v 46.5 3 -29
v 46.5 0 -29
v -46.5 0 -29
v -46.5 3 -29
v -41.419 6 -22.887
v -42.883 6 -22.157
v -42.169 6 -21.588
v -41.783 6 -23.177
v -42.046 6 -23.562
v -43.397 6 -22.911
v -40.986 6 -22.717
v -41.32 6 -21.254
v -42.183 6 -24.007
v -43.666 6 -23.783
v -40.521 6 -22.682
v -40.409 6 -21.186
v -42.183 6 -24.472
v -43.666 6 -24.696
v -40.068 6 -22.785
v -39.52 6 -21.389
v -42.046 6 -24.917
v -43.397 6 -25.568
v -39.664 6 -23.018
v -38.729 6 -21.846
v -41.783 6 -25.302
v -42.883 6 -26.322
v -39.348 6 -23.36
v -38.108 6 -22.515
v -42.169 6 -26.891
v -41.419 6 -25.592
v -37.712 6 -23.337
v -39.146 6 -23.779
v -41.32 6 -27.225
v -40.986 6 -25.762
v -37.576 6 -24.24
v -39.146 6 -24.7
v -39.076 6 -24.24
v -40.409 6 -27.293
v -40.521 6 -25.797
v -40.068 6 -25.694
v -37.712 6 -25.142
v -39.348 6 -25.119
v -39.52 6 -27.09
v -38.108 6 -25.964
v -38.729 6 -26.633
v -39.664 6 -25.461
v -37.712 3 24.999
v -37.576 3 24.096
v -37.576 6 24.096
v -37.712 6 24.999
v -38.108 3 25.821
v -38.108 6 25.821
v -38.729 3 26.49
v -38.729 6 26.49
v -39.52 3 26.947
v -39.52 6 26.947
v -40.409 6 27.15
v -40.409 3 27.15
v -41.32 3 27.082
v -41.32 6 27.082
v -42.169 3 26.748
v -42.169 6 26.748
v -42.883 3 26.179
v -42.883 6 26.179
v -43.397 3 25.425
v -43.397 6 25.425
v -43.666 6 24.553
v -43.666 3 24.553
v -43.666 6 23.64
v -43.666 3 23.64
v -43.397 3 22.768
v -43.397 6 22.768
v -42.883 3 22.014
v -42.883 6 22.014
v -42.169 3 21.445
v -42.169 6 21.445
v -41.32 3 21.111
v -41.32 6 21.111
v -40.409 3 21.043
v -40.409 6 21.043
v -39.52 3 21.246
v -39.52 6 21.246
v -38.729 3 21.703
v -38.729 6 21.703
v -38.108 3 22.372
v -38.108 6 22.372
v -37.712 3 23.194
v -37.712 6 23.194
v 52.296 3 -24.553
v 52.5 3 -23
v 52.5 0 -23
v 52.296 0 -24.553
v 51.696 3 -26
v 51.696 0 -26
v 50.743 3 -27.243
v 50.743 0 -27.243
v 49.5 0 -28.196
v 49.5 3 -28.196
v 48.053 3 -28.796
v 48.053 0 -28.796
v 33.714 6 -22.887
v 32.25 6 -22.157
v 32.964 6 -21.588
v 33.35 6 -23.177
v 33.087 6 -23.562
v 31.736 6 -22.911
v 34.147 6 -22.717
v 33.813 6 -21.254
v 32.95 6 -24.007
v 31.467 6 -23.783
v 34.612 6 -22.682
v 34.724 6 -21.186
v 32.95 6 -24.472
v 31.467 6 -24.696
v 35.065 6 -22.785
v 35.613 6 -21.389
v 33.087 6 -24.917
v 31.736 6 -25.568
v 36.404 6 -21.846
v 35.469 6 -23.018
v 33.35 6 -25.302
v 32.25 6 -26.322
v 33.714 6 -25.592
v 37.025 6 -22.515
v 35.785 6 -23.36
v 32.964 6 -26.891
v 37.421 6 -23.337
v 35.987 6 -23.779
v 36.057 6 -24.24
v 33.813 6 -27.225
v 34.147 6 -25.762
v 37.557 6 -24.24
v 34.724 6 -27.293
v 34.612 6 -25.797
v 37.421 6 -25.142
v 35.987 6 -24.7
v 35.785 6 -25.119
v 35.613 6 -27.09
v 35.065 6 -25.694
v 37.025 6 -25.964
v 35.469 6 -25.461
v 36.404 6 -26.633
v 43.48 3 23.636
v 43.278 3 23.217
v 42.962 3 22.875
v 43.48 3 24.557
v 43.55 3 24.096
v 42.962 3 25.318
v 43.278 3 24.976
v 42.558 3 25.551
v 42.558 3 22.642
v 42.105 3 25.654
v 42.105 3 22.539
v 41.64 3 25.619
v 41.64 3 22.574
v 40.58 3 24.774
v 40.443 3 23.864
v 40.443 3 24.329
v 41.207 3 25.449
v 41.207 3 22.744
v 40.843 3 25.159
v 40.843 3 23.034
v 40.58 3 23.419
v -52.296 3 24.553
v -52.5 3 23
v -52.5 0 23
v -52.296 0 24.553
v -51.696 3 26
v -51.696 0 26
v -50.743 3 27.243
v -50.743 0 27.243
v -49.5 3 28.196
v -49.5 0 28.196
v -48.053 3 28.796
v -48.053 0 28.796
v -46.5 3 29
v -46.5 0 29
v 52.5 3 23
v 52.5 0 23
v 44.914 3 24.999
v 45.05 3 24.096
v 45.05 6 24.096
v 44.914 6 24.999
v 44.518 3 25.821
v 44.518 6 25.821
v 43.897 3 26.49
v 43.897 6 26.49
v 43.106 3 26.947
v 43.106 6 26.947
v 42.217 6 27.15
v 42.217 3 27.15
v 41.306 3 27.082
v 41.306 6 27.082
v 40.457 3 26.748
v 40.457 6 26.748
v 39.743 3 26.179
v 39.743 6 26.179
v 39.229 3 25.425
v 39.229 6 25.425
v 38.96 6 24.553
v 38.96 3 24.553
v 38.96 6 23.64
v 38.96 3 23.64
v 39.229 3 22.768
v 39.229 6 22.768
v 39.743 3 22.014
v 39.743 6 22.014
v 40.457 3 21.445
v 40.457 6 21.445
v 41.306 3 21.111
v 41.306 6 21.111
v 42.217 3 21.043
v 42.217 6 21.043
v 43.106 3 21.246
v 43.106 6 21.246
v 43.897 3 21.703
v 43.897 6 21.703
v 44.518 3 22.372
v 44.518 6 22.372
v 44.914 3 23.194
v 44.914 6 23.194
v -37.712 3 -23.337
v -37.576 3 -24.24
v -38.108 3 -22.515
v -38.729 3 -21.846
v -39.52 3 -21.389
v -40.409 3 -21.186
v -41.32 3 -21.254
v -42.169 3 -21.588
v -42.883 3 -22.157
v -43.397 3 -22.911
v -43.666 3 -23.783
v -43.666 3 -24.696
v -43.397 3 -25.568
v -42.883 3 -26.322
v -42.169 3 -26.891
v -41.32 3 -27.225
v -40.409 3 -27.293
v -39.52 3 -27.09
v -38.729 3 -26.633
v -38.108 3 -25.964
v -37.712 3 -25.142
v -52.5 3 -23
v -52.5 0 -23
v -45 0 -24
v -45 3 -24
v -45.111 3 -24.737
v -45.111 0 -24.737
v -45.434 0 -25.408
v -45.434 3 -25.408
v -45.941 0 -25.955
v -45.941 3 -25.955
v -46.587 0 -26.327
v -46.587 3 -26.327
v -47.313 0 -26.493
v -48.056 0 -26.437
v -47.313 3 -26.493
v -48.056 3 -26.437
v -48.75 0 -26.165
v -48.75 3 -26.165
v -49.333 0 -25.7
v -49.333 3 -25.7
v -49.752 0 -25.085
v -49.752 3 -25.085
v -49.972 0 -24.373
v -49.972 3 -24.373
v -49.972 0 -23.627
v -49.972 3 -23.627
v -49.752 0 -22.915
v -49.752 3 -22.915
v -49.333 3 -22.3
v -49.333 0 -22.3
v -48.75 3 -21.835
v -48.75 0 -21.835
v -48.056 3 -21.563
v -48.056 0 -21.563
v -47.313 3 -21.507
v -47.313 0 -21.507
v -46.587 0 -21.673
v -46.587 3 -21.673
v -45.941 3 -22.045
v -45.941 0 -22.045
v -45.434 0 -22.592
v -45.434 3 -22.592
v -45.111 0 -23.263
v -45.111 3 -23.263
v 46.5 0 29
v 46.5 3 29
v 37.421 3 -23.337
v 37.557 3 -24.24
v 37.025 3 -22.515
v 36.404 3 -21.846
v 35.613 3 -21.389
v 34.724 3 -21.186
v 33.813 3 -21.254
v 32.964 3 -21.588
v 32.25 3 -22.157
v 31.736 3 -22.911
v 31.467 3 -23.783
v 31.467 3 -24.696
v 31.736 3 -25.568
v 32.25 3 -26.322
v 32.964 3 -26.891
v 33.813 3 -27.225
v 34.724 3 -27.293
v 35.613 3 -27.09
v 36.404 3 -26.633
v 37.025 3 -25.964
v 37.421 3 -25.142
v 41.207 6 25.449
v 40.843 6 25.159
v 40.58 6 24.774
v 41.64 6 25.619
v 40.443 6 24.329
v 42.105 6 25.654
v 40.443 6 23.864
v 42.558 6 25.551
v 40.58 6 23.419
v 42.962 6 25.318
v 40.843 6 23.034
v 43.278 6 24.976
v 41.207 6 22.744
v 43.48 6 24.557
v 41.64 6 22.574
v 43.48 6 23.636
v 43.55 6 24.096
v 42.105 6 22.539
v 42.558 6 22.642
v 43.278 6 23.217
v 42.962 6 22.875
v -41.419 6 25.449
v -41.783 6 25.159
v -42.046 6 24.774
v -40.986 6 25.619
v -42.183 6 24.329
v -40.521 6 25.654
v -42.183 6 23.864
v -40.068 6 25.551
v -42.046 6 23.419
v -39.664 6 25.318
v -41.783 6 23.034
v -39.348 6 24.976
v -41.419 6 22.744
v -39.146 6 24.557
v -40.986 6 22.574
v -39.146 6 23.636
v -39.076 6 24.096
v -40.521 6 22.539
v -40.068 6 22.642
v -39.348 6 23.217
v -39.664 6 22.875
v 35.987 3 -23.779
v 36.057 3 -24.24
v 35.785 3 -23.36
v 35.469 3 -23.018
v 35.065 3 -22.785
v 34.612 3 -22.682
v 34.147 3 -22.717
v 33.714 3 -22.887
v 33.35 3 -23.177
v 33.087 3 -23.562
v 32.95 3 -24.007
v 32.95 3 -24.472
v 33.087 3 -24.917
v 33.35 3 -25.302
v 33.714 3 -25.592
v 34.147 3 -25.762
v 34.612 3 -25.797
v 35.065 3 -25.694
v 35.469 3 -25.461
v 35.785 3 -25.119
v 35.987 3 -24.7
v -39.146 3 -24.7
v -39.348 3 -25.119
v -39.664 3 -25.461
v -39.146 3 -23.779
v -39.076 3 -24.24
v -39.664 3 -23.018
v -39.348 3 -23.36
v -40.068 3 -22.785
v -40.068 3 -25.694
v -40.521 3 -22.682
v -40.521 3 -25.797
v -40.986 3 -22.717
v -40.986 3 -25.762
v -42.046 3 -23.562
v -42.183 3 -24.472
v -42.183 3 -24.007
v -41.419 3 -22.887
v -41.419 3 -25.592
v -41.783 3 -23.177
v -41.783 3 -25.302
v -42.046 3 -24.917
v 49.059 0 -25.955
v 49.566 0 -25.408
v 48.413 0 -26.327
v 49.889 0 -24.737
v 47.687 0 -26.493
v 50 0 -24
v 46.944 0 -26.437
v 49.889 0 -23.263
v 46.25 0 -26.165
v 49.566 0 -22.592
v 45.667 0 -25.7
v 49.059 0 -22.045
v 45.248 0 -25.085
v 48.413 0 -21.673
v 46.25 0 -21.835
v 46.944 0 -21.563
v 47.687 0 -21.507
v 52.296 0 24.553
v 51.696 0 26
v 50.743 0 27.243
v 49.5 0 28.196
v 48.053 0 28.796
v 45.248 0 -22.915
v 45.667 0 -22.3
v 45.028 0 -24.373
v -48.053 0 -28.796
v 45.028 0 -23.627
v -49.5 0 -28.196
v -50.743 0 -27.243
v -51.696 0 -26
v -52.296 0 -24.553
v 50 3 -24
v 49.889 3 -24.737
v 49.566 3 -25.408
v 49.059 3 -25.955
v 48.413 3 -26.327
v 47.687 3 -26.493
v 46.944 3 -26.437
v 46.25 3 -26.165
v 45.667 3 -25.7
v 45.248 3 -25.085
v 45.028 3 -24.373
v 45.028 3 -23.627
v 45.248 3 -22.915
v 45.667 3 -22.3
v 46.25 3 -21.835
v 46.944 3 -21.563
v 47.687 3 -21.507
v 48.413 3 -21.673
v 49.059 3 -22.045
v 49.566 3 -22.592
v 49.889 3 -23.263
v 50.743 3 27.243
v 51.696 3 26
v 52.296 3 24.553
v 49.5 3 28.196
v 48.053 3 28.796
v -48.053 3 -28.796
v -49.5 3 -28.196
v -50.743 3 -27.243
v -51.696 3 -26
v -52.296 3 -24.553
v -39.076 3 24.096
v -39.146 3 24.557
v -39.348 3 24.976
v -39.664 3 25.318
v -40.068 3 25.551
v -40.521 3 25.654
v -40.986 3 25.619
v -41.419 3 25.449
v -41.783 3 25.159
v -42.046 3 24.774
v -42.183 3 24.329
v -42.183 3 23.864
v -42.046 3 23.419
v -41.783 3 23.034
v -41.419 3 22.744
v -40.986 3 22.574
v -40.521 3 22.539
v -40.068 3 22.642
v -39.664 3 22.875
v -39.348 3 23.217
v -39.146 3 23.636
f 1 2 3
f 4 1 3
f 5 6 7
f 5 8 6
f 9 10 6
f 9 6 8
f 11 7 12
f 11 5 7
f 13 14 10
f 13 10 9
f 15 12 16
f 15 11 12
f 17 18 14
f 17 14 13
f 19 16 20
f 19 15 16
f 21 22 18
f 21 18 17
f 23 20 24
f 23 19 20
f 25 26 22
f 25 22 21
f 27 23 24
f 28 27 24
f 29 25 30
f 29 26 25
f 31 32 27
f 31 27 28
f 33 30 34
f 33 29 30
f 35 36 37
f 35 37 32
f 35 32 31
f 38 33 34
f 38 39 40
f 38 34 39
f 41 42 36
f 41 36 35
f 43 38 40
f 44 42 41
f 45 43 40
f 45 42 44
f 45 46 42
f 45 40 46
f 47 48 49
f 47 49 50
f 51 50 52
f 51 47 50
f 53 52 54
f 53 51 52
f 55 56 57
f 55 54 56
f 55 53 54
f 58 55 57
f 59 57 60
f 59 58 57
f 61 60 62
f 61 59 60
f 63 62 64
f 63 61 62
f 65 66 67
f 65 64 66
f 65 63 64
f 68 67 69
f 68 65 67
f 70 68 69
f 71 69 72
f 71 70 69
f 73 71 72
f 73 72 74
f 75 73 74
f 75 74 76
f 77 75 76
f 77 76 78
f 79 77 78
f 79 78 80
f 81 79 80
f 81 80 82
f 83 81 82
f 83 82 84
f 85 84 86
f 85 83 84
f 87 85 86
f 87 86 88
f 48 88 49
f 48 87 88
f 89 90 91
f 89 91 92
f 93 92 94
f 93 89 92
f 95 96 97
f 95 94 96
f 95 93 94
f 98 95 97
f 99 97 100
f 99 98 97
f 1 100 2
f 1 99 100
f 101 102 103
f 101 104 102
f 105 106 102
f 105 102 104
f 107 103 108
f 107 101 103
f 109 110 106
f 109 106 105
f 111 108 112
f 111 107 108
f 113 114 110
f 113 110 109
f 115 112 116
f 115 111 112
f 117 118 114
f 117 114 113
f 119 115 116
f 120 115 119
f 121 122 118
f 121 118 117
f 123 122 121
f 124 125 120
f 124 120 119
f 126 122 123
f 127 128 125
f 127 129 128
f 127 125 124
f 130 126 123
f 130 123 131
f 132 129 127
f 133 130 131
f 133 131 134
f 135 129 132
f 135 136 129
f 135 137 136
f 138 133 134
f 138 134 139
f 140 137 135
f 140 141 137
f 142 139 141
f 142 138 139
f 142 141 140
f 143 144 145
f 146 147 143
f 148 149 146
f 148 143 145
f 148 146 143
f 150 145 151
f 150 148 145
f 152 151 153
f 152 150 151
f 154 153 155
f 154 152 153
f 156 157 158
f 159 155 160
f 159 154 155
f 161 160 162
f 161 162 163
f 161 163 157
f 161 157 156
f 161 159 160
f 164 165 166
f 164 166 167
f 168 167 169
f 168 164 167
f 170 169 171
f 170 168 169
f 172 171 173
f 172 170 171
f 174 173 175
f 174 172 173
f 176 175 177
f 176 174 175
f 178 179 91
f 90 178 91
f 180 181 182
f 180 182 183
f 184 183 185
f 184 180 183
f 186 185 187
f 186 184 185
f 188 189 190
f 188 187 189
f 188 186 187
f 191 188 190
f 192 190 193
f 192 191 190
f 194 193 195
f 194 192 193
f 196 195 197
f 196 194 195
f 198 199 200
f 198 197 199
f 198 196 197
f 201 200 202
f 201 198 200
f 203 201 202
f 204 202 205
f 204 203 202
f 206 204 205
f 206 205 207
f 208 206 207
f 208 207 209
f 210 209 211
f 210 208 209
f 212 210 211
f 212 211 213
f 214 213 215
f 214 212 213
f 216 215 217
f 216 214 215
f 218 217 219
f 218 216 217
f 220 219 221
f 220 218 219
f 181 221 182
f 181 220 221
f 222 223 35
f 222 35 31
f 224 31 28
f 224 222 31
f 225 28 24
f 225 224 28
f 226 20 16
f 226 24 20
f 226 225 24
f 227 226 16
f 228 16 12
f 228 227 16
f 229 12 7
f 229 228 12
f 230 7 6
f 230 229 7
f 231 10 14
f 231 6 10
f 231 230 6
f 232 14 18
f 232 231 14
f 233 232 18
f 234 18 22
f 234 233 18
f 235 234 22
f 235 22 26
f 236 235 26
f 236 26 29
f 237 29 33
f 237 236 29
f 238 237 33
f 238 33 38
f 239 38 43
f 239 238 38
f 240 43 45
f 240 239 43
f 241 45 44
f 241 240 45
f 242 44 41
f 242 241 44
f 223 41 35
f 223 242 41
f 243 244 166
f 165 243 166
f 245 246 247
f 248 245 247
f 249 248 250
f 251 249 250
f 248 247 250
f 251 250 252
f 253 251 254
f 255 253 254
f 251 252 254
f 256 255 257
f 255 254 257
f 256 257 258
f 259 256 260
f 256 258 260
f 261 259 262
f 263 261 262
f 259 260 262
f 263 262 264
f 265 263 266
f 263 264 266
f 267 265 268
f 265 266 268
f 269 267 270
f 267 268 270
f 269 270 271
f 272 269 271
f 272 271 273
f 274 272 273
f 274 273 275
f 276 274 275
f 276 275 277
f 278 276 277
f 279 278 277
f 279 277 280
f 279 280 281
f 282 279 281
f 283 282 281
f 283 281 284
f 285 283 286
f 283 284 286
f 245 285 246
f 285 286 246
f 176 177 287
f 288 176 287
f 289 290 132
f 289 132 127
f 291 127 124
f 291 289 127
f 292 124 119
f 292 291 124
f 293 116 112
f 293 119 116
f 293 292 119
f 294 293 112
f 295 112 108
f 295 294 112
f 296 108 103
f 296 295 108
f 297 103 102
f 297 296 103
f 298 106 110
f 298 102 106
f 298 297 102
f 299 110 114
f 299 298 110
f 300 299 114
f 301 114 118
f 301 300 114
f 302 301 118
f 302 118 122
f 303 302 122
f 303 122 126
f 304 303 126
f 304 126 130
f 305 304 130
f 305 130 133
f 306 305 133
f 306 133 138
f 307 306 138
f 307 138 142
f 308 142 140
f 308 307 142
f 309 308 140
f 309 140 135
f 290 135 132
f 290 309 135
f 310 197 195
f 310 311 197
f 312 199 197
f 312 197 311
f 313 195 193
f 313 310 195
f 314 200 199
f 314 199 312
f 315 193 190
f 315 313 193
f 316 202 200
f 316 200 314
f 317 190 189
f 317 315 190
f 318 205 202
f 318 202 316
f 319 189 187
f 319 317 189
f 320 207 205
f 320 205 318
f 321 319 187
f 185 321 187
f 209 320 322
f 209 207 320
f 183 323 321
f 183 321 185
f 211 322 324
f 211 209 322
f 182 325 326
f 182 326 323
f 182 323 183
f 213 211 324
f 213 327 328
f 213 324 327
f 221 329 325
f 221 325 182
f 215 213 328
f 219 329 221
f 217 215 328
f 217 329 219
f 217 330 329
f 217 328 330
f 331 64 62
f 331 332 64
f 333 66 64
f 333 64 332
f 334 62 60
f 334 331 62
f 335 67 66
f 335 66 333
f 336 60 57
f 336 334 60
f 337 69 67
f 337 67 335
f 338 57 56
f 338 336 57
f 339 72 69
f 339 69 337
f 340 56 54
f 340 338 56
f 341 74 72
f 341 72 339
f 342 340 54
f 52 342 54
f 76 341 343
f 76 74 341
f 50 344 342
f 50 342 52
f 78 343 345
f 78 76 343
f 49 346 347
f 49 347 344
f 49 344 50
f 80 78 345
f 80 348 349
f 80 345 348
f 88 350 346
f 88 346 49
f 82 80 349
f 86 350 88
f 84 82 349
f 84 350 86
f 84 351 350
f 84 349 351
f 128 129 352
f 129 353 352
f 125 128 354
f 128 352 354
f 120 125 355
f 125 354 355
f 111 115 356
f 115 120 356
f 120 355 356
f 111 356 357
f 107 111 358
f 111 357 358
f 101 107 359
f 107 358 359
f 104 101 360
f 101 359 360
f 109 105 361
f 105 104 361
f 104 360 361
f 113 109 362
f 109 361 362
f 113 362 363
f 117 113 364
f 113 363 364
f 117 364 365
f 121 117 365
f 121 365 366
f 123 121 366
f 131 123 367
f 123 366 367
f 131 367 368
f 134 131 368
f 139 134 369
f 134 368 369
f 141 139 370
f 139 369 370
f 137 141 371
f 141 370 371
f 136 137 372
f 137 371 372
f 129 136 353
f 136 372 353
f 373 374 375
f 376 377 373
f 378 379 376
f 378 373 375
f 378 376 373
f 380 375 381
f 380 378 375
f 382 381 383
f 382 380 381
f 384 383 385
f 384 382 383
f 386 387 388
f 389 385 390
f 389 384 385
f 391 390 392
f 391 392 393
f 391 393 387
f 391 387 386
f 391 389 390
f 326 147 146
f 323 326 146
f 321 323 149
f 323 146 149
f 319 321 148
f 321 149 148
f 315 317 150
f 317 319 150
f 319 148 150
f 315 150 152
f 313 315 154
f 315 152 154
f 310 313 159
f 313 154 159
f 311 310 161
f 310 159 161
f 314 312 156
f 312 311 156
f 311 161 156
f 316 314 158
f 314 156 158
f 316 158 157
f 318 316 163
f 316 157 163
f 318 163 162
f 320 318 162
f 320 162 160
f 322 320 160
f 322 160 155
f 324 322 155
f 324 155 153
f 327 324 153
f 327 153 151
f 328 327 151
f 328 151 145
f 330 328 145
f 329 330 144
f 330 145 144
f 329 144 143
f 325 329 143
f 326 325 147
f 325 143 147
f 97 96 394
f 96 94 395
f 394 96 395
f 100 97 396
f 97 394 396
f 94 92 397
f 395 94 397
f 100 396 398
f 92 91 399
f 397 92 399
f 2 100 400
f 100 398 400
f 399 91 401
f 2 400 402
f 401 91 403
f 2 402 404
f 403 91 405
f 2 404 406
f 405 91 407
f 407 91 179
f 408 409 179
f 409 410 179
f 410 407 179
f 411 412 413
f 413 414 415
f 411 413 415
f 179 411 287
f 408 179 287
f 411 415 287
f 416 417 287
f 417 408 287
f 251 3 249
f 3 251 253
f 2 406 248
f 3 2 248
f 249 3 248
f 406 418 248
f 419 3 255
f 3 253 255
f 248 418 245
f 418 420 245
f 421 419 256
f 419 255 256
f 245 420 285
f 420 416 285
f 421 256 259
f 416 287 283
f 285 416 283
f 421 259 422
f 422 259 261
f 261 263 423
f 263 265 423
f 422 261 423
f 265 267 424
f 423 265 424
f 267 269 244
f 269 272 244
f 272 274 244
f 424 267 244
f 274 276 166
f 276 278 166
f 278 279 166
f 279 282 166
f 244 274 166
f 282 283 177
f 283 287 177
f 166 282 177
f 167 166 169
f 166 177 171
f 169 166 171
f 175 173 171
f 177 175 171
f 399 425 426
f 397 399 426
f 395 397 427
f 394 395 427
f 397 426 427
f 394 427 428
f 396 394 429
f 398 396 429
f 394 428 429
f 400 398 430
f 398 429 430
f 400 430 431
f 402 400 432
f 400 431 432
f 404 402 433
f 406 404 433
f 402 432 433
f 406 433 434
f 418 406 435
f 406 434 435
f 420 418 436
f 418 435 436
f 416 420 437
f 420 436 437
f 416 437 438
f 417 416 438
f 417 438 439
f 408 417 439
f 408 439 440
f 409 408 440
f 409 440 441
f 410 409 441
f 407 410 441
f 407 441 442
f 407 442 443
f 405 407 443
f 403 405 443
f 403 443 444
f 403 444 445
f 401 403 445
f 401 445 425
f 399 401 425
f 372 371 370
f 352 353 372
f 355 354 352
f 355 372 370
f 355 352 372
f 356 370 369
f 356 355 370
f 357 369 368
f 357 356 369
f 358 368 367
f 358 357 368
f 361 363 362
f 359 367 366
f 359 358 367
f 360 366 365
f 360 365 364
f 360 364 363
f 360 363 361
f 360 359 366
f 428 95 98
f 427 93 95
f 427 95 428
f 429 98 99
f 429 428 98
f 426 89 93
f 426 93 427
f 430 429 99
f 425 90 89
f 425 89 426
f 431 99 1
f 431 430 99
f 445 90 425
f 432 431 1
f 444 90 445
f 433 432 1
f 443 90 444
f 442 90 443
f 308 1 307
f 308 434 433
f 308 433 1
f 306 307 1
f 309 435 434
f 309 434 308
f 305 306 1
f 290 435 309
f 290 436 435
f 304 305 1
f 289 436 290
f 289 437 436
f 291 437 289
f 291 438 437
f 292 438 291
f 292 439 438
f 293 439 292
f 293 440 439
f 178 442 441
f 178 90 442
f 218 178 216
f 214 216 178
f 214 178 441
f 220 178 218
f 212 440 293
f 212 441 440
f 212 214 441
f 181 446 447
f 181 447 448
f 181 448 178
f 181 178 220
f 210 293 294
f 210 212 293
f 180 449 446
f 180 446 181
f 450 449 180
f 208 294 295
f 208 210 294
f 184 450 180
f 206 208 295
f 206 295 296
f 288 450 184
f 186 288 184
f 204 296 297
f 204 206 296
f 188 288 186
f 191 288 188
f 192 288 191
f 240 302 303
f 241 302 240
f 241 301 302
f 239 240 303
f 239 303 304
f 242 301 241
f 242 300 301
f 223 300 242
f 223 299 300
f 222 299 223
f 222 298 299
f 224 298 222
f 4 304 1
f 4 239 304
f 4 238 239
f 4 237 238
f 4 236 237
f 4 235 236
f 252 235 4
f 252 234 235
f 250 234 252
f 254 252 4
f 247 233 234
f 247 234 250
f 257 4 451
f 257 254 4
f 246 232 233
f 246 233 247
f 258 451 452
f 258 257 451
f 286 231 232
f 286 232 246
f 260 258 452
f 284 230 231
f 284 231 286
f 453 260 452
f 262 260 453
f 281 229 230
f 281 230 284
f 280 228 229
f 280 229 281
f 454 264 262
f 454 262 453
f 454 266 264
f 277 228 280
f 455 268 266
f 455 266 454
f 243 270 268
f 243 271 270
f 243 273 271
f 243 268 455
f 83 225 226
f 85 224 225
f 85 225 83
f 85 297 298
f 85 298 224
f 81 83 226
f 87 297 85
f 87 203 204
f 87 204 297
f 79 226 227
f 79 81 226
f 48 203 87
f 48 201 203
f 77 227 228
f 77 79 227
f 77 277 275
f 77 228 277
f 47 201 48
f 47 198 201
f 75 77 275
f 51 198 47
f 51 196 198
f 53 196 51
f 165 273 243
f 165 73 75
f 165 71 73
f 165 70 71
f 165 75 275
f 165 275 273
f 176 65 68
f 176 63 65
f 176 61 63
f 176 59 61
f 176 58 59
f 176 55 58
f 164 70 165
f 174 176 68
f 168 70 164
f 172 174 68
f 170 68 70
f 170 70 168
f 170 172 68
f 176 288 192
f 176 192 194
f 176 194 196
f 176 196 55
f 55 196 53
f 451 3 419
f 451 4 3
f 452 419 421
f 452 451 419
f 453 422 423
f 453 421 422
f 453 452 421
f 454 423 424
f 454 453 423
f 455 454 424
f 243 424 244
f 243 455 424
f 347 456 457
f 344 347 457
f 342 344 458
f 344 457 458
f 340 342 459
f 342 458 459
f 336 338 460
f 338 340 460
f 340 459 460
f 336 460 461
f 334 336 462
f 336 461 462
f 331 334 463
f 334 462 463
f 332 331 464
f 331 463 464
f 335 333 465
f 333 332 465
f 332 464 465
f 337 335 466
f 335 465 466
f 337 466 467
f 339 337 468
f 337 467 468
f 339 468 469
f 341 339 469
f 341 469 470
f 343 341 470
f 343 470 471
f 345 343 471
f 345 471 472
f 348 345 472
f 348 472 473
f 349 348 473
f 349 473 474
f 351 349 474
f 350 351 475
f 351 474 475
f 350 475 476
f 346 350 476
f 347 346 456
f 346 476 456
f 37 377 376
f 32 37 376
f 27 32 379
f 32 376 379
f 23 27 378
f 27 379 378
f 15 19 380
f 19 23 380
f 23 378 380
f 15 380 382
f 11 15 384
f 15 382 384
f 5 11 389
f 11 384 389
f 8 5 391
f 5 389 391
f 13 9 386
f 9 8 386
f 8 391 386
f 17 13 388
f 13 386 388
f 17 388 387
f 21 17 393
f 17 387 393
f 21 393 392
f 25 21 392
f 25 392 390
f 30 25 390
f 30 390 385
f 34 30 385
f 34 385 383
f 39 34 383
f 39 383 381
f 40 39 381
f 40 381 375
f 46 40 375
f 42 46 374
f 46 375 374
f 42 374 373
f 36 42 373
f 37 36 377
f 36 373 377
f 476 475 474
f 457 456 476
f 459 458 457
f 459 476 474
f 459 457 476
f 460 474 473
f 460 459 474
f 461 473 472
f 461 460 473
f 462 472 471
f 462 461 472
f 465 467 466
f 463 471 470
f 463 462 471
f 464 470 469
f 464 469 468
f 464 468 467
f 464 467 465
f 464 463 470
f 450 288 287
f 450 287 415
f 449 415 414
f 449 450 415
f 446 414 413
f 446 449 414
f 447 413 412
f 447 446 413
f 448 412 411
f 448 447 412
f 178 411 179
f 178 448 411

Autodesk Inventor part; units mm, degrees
ref_plane "YZ Plane" through (0, 0, 0) normal (1, 0, 0) x (0, 1, 0)
ref_plane "XZ Plane" through (0, 0, 0) normal (0, 1, 0) x (-1, 0, 0)
ref_plane "XY Plane" through (0, 0, 0) normal (0, 0, 1) x (1, 0, 0)
sketch "Sketch1" plane through (0, 0, 0) normal (0, 1, 0) x (-1, 0, 0)
  line L0 (52.5, 29) -> (-52.5, 29)
  line L1 (-52.5, 29) -> (-52.5, -29)
  line L2 (-52.5, -29) -> (52.5, -29)
  line L3 (52.5, -29) -> (52.5, 29)
  line L4 (52.5, 29) -> (-52.5, -29) construction
  line L5 (-52.5, 29) -> (52.5, -29) construction
  point P0 (0, 0)
  dimension "d0" = 105
  dimension "d1" = 58
extrude "Extrusion1" add sketch "Sketch1" along normal blind 3
sketch "Sketch2" plane through (0, 3, 0) normal (0, 1, 0) x (1, 0, 0)
  circle A0 centre (41.9878, -24.0965) radius 1.562
  circle A1 centre (41.9878, -24.0965) radius 3.062
  circle A2 centre (-40.6382, -24.0965) radius 1.562
  circle A3 centre (-40.6382, -24.0965) radius 3.062
  circle A4 centre (-40.6382, 24.2395) radius 1.562
  circle A5 centre (-40.6382, 24.2395) radius 3.062
  circle A6 centre (34.4948, 24.2395) radius 1.562
  circle A7 centre (34.4948, 24.2395) radius 3.062
  point P0 (0, 0)
  dimension "d4" = 3.124
  dimension "d5" = 1.5
  dimension "d6" = 3.124
  dimension "d7" = 1.5
  dimension "d8" = 82.626
  dimension "d9" = 3.124
  dimension "d10" = 1.5
  dimension "d11" = 48.336
  dimension "d12" = 3.124
  dimension "d13" = 1.5
  dimension "d14" = 75.133
  dimension "d15" = 0
  dimension "d16" = 0
extrude "Extrusion2" add sketch "Sketch2" along normal blind 3
sketch "Sketch3" plane through (0, 3, 0) normal (0, 1, 0) x (1, 0, 0)
  circle A0 centre (47.5, 24) radius 2.5
  line L0 (52.5, 29) -> (-52.5, 29) projected
  line L1 (52.5, -29) -> (52.5, 29) projected
  circle A1 centre (-47.5, 24) radius 2.5
  line L2 (-52.5, 29) -> (-52.5, -29) projected
  point P0 (0, 0)
  dimension "d19" = 5
  dimension "d20" = 5
  dimension "d21" = 5
  dimension "d22" = 5
  dimension "d23" = 5
  dimension "d24" = 5
extrude "Extrusion3" cut sketch "Sketch3" against normal through all
fillet "Fillet1" radius 6 4 edges at (52.5, 1.5, 29) (52.5, 1.5, -29) (-52.5, 1.5, 29) (-52.5, 1.5, -29)
properties part number "placa_arduino"
